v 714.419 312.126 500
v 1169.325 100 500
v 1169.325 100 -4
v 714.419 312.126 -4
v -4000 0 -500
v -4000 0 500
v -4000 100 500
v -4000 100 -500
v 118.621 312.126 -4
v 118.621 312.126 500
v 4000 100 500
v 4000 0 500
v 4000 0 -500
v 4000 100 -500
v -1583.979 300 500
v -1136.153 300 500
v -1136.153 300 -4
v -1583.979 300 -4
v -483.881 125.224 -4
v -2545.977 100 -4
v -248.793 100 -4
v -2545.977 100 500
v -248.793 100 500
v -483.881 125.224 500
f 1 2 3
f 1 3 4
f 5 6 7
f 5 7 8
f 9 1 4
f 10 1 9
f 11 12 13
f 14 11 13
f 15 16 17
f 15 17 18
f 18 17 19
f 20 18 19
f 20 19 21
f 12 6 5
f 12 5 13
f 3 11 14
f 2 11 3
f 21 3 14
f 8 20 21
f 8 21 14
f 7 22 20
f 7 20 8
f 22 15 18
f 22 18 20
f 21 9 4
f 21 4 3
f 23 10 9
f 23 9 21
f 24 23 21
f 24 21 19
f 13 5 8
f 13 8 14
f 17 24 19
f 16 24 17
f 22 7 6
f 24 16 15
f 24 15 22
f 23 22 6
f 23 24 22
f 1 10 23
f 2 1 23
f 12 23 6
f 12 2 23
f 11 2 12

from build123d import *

# Parameters (mm, degrees)
SKETCH1_W           = 8000
SKETCH1_H           = 1000
BOSS_EXTRUDE1_DEPTH = 100
BOSS_EXTRUDE2_DEPTH = 504


with BuildPart() as part:
    # Sketch1 → Boss-Extrude1 (new body)
    with BuildSketch(Plane(origin=(0, 0, 0), x_dir=(1, 0, 0), z_dir=(0, 1, 0))):
        Rectangle(SKETCH1_W, SKETCH1_H)
    extrude(amount=BOSS_EXTRUDE1_DEPTH)

    # Sketch2 → Boss-Extrude2 (add)
    with BuildSketch(Plane.XY.offset(500)):
        Polygon((1169.324917581, 100), (714.418726972, 312.126240423), (118.620890376, 312.126240423), (-248.792535656, 100), (-483.880856043, 125.224318456), (-1136.152579494, 300), (-1583.979143674, 300), (-2545.976948209, 100), (-2545.976948209, 0), (2172.788144725, 0), (2172.788144725, 100), align=None)
    extrude(amount=-BOSS_EXTRUDE2_DEPTH)


solid = part.part
